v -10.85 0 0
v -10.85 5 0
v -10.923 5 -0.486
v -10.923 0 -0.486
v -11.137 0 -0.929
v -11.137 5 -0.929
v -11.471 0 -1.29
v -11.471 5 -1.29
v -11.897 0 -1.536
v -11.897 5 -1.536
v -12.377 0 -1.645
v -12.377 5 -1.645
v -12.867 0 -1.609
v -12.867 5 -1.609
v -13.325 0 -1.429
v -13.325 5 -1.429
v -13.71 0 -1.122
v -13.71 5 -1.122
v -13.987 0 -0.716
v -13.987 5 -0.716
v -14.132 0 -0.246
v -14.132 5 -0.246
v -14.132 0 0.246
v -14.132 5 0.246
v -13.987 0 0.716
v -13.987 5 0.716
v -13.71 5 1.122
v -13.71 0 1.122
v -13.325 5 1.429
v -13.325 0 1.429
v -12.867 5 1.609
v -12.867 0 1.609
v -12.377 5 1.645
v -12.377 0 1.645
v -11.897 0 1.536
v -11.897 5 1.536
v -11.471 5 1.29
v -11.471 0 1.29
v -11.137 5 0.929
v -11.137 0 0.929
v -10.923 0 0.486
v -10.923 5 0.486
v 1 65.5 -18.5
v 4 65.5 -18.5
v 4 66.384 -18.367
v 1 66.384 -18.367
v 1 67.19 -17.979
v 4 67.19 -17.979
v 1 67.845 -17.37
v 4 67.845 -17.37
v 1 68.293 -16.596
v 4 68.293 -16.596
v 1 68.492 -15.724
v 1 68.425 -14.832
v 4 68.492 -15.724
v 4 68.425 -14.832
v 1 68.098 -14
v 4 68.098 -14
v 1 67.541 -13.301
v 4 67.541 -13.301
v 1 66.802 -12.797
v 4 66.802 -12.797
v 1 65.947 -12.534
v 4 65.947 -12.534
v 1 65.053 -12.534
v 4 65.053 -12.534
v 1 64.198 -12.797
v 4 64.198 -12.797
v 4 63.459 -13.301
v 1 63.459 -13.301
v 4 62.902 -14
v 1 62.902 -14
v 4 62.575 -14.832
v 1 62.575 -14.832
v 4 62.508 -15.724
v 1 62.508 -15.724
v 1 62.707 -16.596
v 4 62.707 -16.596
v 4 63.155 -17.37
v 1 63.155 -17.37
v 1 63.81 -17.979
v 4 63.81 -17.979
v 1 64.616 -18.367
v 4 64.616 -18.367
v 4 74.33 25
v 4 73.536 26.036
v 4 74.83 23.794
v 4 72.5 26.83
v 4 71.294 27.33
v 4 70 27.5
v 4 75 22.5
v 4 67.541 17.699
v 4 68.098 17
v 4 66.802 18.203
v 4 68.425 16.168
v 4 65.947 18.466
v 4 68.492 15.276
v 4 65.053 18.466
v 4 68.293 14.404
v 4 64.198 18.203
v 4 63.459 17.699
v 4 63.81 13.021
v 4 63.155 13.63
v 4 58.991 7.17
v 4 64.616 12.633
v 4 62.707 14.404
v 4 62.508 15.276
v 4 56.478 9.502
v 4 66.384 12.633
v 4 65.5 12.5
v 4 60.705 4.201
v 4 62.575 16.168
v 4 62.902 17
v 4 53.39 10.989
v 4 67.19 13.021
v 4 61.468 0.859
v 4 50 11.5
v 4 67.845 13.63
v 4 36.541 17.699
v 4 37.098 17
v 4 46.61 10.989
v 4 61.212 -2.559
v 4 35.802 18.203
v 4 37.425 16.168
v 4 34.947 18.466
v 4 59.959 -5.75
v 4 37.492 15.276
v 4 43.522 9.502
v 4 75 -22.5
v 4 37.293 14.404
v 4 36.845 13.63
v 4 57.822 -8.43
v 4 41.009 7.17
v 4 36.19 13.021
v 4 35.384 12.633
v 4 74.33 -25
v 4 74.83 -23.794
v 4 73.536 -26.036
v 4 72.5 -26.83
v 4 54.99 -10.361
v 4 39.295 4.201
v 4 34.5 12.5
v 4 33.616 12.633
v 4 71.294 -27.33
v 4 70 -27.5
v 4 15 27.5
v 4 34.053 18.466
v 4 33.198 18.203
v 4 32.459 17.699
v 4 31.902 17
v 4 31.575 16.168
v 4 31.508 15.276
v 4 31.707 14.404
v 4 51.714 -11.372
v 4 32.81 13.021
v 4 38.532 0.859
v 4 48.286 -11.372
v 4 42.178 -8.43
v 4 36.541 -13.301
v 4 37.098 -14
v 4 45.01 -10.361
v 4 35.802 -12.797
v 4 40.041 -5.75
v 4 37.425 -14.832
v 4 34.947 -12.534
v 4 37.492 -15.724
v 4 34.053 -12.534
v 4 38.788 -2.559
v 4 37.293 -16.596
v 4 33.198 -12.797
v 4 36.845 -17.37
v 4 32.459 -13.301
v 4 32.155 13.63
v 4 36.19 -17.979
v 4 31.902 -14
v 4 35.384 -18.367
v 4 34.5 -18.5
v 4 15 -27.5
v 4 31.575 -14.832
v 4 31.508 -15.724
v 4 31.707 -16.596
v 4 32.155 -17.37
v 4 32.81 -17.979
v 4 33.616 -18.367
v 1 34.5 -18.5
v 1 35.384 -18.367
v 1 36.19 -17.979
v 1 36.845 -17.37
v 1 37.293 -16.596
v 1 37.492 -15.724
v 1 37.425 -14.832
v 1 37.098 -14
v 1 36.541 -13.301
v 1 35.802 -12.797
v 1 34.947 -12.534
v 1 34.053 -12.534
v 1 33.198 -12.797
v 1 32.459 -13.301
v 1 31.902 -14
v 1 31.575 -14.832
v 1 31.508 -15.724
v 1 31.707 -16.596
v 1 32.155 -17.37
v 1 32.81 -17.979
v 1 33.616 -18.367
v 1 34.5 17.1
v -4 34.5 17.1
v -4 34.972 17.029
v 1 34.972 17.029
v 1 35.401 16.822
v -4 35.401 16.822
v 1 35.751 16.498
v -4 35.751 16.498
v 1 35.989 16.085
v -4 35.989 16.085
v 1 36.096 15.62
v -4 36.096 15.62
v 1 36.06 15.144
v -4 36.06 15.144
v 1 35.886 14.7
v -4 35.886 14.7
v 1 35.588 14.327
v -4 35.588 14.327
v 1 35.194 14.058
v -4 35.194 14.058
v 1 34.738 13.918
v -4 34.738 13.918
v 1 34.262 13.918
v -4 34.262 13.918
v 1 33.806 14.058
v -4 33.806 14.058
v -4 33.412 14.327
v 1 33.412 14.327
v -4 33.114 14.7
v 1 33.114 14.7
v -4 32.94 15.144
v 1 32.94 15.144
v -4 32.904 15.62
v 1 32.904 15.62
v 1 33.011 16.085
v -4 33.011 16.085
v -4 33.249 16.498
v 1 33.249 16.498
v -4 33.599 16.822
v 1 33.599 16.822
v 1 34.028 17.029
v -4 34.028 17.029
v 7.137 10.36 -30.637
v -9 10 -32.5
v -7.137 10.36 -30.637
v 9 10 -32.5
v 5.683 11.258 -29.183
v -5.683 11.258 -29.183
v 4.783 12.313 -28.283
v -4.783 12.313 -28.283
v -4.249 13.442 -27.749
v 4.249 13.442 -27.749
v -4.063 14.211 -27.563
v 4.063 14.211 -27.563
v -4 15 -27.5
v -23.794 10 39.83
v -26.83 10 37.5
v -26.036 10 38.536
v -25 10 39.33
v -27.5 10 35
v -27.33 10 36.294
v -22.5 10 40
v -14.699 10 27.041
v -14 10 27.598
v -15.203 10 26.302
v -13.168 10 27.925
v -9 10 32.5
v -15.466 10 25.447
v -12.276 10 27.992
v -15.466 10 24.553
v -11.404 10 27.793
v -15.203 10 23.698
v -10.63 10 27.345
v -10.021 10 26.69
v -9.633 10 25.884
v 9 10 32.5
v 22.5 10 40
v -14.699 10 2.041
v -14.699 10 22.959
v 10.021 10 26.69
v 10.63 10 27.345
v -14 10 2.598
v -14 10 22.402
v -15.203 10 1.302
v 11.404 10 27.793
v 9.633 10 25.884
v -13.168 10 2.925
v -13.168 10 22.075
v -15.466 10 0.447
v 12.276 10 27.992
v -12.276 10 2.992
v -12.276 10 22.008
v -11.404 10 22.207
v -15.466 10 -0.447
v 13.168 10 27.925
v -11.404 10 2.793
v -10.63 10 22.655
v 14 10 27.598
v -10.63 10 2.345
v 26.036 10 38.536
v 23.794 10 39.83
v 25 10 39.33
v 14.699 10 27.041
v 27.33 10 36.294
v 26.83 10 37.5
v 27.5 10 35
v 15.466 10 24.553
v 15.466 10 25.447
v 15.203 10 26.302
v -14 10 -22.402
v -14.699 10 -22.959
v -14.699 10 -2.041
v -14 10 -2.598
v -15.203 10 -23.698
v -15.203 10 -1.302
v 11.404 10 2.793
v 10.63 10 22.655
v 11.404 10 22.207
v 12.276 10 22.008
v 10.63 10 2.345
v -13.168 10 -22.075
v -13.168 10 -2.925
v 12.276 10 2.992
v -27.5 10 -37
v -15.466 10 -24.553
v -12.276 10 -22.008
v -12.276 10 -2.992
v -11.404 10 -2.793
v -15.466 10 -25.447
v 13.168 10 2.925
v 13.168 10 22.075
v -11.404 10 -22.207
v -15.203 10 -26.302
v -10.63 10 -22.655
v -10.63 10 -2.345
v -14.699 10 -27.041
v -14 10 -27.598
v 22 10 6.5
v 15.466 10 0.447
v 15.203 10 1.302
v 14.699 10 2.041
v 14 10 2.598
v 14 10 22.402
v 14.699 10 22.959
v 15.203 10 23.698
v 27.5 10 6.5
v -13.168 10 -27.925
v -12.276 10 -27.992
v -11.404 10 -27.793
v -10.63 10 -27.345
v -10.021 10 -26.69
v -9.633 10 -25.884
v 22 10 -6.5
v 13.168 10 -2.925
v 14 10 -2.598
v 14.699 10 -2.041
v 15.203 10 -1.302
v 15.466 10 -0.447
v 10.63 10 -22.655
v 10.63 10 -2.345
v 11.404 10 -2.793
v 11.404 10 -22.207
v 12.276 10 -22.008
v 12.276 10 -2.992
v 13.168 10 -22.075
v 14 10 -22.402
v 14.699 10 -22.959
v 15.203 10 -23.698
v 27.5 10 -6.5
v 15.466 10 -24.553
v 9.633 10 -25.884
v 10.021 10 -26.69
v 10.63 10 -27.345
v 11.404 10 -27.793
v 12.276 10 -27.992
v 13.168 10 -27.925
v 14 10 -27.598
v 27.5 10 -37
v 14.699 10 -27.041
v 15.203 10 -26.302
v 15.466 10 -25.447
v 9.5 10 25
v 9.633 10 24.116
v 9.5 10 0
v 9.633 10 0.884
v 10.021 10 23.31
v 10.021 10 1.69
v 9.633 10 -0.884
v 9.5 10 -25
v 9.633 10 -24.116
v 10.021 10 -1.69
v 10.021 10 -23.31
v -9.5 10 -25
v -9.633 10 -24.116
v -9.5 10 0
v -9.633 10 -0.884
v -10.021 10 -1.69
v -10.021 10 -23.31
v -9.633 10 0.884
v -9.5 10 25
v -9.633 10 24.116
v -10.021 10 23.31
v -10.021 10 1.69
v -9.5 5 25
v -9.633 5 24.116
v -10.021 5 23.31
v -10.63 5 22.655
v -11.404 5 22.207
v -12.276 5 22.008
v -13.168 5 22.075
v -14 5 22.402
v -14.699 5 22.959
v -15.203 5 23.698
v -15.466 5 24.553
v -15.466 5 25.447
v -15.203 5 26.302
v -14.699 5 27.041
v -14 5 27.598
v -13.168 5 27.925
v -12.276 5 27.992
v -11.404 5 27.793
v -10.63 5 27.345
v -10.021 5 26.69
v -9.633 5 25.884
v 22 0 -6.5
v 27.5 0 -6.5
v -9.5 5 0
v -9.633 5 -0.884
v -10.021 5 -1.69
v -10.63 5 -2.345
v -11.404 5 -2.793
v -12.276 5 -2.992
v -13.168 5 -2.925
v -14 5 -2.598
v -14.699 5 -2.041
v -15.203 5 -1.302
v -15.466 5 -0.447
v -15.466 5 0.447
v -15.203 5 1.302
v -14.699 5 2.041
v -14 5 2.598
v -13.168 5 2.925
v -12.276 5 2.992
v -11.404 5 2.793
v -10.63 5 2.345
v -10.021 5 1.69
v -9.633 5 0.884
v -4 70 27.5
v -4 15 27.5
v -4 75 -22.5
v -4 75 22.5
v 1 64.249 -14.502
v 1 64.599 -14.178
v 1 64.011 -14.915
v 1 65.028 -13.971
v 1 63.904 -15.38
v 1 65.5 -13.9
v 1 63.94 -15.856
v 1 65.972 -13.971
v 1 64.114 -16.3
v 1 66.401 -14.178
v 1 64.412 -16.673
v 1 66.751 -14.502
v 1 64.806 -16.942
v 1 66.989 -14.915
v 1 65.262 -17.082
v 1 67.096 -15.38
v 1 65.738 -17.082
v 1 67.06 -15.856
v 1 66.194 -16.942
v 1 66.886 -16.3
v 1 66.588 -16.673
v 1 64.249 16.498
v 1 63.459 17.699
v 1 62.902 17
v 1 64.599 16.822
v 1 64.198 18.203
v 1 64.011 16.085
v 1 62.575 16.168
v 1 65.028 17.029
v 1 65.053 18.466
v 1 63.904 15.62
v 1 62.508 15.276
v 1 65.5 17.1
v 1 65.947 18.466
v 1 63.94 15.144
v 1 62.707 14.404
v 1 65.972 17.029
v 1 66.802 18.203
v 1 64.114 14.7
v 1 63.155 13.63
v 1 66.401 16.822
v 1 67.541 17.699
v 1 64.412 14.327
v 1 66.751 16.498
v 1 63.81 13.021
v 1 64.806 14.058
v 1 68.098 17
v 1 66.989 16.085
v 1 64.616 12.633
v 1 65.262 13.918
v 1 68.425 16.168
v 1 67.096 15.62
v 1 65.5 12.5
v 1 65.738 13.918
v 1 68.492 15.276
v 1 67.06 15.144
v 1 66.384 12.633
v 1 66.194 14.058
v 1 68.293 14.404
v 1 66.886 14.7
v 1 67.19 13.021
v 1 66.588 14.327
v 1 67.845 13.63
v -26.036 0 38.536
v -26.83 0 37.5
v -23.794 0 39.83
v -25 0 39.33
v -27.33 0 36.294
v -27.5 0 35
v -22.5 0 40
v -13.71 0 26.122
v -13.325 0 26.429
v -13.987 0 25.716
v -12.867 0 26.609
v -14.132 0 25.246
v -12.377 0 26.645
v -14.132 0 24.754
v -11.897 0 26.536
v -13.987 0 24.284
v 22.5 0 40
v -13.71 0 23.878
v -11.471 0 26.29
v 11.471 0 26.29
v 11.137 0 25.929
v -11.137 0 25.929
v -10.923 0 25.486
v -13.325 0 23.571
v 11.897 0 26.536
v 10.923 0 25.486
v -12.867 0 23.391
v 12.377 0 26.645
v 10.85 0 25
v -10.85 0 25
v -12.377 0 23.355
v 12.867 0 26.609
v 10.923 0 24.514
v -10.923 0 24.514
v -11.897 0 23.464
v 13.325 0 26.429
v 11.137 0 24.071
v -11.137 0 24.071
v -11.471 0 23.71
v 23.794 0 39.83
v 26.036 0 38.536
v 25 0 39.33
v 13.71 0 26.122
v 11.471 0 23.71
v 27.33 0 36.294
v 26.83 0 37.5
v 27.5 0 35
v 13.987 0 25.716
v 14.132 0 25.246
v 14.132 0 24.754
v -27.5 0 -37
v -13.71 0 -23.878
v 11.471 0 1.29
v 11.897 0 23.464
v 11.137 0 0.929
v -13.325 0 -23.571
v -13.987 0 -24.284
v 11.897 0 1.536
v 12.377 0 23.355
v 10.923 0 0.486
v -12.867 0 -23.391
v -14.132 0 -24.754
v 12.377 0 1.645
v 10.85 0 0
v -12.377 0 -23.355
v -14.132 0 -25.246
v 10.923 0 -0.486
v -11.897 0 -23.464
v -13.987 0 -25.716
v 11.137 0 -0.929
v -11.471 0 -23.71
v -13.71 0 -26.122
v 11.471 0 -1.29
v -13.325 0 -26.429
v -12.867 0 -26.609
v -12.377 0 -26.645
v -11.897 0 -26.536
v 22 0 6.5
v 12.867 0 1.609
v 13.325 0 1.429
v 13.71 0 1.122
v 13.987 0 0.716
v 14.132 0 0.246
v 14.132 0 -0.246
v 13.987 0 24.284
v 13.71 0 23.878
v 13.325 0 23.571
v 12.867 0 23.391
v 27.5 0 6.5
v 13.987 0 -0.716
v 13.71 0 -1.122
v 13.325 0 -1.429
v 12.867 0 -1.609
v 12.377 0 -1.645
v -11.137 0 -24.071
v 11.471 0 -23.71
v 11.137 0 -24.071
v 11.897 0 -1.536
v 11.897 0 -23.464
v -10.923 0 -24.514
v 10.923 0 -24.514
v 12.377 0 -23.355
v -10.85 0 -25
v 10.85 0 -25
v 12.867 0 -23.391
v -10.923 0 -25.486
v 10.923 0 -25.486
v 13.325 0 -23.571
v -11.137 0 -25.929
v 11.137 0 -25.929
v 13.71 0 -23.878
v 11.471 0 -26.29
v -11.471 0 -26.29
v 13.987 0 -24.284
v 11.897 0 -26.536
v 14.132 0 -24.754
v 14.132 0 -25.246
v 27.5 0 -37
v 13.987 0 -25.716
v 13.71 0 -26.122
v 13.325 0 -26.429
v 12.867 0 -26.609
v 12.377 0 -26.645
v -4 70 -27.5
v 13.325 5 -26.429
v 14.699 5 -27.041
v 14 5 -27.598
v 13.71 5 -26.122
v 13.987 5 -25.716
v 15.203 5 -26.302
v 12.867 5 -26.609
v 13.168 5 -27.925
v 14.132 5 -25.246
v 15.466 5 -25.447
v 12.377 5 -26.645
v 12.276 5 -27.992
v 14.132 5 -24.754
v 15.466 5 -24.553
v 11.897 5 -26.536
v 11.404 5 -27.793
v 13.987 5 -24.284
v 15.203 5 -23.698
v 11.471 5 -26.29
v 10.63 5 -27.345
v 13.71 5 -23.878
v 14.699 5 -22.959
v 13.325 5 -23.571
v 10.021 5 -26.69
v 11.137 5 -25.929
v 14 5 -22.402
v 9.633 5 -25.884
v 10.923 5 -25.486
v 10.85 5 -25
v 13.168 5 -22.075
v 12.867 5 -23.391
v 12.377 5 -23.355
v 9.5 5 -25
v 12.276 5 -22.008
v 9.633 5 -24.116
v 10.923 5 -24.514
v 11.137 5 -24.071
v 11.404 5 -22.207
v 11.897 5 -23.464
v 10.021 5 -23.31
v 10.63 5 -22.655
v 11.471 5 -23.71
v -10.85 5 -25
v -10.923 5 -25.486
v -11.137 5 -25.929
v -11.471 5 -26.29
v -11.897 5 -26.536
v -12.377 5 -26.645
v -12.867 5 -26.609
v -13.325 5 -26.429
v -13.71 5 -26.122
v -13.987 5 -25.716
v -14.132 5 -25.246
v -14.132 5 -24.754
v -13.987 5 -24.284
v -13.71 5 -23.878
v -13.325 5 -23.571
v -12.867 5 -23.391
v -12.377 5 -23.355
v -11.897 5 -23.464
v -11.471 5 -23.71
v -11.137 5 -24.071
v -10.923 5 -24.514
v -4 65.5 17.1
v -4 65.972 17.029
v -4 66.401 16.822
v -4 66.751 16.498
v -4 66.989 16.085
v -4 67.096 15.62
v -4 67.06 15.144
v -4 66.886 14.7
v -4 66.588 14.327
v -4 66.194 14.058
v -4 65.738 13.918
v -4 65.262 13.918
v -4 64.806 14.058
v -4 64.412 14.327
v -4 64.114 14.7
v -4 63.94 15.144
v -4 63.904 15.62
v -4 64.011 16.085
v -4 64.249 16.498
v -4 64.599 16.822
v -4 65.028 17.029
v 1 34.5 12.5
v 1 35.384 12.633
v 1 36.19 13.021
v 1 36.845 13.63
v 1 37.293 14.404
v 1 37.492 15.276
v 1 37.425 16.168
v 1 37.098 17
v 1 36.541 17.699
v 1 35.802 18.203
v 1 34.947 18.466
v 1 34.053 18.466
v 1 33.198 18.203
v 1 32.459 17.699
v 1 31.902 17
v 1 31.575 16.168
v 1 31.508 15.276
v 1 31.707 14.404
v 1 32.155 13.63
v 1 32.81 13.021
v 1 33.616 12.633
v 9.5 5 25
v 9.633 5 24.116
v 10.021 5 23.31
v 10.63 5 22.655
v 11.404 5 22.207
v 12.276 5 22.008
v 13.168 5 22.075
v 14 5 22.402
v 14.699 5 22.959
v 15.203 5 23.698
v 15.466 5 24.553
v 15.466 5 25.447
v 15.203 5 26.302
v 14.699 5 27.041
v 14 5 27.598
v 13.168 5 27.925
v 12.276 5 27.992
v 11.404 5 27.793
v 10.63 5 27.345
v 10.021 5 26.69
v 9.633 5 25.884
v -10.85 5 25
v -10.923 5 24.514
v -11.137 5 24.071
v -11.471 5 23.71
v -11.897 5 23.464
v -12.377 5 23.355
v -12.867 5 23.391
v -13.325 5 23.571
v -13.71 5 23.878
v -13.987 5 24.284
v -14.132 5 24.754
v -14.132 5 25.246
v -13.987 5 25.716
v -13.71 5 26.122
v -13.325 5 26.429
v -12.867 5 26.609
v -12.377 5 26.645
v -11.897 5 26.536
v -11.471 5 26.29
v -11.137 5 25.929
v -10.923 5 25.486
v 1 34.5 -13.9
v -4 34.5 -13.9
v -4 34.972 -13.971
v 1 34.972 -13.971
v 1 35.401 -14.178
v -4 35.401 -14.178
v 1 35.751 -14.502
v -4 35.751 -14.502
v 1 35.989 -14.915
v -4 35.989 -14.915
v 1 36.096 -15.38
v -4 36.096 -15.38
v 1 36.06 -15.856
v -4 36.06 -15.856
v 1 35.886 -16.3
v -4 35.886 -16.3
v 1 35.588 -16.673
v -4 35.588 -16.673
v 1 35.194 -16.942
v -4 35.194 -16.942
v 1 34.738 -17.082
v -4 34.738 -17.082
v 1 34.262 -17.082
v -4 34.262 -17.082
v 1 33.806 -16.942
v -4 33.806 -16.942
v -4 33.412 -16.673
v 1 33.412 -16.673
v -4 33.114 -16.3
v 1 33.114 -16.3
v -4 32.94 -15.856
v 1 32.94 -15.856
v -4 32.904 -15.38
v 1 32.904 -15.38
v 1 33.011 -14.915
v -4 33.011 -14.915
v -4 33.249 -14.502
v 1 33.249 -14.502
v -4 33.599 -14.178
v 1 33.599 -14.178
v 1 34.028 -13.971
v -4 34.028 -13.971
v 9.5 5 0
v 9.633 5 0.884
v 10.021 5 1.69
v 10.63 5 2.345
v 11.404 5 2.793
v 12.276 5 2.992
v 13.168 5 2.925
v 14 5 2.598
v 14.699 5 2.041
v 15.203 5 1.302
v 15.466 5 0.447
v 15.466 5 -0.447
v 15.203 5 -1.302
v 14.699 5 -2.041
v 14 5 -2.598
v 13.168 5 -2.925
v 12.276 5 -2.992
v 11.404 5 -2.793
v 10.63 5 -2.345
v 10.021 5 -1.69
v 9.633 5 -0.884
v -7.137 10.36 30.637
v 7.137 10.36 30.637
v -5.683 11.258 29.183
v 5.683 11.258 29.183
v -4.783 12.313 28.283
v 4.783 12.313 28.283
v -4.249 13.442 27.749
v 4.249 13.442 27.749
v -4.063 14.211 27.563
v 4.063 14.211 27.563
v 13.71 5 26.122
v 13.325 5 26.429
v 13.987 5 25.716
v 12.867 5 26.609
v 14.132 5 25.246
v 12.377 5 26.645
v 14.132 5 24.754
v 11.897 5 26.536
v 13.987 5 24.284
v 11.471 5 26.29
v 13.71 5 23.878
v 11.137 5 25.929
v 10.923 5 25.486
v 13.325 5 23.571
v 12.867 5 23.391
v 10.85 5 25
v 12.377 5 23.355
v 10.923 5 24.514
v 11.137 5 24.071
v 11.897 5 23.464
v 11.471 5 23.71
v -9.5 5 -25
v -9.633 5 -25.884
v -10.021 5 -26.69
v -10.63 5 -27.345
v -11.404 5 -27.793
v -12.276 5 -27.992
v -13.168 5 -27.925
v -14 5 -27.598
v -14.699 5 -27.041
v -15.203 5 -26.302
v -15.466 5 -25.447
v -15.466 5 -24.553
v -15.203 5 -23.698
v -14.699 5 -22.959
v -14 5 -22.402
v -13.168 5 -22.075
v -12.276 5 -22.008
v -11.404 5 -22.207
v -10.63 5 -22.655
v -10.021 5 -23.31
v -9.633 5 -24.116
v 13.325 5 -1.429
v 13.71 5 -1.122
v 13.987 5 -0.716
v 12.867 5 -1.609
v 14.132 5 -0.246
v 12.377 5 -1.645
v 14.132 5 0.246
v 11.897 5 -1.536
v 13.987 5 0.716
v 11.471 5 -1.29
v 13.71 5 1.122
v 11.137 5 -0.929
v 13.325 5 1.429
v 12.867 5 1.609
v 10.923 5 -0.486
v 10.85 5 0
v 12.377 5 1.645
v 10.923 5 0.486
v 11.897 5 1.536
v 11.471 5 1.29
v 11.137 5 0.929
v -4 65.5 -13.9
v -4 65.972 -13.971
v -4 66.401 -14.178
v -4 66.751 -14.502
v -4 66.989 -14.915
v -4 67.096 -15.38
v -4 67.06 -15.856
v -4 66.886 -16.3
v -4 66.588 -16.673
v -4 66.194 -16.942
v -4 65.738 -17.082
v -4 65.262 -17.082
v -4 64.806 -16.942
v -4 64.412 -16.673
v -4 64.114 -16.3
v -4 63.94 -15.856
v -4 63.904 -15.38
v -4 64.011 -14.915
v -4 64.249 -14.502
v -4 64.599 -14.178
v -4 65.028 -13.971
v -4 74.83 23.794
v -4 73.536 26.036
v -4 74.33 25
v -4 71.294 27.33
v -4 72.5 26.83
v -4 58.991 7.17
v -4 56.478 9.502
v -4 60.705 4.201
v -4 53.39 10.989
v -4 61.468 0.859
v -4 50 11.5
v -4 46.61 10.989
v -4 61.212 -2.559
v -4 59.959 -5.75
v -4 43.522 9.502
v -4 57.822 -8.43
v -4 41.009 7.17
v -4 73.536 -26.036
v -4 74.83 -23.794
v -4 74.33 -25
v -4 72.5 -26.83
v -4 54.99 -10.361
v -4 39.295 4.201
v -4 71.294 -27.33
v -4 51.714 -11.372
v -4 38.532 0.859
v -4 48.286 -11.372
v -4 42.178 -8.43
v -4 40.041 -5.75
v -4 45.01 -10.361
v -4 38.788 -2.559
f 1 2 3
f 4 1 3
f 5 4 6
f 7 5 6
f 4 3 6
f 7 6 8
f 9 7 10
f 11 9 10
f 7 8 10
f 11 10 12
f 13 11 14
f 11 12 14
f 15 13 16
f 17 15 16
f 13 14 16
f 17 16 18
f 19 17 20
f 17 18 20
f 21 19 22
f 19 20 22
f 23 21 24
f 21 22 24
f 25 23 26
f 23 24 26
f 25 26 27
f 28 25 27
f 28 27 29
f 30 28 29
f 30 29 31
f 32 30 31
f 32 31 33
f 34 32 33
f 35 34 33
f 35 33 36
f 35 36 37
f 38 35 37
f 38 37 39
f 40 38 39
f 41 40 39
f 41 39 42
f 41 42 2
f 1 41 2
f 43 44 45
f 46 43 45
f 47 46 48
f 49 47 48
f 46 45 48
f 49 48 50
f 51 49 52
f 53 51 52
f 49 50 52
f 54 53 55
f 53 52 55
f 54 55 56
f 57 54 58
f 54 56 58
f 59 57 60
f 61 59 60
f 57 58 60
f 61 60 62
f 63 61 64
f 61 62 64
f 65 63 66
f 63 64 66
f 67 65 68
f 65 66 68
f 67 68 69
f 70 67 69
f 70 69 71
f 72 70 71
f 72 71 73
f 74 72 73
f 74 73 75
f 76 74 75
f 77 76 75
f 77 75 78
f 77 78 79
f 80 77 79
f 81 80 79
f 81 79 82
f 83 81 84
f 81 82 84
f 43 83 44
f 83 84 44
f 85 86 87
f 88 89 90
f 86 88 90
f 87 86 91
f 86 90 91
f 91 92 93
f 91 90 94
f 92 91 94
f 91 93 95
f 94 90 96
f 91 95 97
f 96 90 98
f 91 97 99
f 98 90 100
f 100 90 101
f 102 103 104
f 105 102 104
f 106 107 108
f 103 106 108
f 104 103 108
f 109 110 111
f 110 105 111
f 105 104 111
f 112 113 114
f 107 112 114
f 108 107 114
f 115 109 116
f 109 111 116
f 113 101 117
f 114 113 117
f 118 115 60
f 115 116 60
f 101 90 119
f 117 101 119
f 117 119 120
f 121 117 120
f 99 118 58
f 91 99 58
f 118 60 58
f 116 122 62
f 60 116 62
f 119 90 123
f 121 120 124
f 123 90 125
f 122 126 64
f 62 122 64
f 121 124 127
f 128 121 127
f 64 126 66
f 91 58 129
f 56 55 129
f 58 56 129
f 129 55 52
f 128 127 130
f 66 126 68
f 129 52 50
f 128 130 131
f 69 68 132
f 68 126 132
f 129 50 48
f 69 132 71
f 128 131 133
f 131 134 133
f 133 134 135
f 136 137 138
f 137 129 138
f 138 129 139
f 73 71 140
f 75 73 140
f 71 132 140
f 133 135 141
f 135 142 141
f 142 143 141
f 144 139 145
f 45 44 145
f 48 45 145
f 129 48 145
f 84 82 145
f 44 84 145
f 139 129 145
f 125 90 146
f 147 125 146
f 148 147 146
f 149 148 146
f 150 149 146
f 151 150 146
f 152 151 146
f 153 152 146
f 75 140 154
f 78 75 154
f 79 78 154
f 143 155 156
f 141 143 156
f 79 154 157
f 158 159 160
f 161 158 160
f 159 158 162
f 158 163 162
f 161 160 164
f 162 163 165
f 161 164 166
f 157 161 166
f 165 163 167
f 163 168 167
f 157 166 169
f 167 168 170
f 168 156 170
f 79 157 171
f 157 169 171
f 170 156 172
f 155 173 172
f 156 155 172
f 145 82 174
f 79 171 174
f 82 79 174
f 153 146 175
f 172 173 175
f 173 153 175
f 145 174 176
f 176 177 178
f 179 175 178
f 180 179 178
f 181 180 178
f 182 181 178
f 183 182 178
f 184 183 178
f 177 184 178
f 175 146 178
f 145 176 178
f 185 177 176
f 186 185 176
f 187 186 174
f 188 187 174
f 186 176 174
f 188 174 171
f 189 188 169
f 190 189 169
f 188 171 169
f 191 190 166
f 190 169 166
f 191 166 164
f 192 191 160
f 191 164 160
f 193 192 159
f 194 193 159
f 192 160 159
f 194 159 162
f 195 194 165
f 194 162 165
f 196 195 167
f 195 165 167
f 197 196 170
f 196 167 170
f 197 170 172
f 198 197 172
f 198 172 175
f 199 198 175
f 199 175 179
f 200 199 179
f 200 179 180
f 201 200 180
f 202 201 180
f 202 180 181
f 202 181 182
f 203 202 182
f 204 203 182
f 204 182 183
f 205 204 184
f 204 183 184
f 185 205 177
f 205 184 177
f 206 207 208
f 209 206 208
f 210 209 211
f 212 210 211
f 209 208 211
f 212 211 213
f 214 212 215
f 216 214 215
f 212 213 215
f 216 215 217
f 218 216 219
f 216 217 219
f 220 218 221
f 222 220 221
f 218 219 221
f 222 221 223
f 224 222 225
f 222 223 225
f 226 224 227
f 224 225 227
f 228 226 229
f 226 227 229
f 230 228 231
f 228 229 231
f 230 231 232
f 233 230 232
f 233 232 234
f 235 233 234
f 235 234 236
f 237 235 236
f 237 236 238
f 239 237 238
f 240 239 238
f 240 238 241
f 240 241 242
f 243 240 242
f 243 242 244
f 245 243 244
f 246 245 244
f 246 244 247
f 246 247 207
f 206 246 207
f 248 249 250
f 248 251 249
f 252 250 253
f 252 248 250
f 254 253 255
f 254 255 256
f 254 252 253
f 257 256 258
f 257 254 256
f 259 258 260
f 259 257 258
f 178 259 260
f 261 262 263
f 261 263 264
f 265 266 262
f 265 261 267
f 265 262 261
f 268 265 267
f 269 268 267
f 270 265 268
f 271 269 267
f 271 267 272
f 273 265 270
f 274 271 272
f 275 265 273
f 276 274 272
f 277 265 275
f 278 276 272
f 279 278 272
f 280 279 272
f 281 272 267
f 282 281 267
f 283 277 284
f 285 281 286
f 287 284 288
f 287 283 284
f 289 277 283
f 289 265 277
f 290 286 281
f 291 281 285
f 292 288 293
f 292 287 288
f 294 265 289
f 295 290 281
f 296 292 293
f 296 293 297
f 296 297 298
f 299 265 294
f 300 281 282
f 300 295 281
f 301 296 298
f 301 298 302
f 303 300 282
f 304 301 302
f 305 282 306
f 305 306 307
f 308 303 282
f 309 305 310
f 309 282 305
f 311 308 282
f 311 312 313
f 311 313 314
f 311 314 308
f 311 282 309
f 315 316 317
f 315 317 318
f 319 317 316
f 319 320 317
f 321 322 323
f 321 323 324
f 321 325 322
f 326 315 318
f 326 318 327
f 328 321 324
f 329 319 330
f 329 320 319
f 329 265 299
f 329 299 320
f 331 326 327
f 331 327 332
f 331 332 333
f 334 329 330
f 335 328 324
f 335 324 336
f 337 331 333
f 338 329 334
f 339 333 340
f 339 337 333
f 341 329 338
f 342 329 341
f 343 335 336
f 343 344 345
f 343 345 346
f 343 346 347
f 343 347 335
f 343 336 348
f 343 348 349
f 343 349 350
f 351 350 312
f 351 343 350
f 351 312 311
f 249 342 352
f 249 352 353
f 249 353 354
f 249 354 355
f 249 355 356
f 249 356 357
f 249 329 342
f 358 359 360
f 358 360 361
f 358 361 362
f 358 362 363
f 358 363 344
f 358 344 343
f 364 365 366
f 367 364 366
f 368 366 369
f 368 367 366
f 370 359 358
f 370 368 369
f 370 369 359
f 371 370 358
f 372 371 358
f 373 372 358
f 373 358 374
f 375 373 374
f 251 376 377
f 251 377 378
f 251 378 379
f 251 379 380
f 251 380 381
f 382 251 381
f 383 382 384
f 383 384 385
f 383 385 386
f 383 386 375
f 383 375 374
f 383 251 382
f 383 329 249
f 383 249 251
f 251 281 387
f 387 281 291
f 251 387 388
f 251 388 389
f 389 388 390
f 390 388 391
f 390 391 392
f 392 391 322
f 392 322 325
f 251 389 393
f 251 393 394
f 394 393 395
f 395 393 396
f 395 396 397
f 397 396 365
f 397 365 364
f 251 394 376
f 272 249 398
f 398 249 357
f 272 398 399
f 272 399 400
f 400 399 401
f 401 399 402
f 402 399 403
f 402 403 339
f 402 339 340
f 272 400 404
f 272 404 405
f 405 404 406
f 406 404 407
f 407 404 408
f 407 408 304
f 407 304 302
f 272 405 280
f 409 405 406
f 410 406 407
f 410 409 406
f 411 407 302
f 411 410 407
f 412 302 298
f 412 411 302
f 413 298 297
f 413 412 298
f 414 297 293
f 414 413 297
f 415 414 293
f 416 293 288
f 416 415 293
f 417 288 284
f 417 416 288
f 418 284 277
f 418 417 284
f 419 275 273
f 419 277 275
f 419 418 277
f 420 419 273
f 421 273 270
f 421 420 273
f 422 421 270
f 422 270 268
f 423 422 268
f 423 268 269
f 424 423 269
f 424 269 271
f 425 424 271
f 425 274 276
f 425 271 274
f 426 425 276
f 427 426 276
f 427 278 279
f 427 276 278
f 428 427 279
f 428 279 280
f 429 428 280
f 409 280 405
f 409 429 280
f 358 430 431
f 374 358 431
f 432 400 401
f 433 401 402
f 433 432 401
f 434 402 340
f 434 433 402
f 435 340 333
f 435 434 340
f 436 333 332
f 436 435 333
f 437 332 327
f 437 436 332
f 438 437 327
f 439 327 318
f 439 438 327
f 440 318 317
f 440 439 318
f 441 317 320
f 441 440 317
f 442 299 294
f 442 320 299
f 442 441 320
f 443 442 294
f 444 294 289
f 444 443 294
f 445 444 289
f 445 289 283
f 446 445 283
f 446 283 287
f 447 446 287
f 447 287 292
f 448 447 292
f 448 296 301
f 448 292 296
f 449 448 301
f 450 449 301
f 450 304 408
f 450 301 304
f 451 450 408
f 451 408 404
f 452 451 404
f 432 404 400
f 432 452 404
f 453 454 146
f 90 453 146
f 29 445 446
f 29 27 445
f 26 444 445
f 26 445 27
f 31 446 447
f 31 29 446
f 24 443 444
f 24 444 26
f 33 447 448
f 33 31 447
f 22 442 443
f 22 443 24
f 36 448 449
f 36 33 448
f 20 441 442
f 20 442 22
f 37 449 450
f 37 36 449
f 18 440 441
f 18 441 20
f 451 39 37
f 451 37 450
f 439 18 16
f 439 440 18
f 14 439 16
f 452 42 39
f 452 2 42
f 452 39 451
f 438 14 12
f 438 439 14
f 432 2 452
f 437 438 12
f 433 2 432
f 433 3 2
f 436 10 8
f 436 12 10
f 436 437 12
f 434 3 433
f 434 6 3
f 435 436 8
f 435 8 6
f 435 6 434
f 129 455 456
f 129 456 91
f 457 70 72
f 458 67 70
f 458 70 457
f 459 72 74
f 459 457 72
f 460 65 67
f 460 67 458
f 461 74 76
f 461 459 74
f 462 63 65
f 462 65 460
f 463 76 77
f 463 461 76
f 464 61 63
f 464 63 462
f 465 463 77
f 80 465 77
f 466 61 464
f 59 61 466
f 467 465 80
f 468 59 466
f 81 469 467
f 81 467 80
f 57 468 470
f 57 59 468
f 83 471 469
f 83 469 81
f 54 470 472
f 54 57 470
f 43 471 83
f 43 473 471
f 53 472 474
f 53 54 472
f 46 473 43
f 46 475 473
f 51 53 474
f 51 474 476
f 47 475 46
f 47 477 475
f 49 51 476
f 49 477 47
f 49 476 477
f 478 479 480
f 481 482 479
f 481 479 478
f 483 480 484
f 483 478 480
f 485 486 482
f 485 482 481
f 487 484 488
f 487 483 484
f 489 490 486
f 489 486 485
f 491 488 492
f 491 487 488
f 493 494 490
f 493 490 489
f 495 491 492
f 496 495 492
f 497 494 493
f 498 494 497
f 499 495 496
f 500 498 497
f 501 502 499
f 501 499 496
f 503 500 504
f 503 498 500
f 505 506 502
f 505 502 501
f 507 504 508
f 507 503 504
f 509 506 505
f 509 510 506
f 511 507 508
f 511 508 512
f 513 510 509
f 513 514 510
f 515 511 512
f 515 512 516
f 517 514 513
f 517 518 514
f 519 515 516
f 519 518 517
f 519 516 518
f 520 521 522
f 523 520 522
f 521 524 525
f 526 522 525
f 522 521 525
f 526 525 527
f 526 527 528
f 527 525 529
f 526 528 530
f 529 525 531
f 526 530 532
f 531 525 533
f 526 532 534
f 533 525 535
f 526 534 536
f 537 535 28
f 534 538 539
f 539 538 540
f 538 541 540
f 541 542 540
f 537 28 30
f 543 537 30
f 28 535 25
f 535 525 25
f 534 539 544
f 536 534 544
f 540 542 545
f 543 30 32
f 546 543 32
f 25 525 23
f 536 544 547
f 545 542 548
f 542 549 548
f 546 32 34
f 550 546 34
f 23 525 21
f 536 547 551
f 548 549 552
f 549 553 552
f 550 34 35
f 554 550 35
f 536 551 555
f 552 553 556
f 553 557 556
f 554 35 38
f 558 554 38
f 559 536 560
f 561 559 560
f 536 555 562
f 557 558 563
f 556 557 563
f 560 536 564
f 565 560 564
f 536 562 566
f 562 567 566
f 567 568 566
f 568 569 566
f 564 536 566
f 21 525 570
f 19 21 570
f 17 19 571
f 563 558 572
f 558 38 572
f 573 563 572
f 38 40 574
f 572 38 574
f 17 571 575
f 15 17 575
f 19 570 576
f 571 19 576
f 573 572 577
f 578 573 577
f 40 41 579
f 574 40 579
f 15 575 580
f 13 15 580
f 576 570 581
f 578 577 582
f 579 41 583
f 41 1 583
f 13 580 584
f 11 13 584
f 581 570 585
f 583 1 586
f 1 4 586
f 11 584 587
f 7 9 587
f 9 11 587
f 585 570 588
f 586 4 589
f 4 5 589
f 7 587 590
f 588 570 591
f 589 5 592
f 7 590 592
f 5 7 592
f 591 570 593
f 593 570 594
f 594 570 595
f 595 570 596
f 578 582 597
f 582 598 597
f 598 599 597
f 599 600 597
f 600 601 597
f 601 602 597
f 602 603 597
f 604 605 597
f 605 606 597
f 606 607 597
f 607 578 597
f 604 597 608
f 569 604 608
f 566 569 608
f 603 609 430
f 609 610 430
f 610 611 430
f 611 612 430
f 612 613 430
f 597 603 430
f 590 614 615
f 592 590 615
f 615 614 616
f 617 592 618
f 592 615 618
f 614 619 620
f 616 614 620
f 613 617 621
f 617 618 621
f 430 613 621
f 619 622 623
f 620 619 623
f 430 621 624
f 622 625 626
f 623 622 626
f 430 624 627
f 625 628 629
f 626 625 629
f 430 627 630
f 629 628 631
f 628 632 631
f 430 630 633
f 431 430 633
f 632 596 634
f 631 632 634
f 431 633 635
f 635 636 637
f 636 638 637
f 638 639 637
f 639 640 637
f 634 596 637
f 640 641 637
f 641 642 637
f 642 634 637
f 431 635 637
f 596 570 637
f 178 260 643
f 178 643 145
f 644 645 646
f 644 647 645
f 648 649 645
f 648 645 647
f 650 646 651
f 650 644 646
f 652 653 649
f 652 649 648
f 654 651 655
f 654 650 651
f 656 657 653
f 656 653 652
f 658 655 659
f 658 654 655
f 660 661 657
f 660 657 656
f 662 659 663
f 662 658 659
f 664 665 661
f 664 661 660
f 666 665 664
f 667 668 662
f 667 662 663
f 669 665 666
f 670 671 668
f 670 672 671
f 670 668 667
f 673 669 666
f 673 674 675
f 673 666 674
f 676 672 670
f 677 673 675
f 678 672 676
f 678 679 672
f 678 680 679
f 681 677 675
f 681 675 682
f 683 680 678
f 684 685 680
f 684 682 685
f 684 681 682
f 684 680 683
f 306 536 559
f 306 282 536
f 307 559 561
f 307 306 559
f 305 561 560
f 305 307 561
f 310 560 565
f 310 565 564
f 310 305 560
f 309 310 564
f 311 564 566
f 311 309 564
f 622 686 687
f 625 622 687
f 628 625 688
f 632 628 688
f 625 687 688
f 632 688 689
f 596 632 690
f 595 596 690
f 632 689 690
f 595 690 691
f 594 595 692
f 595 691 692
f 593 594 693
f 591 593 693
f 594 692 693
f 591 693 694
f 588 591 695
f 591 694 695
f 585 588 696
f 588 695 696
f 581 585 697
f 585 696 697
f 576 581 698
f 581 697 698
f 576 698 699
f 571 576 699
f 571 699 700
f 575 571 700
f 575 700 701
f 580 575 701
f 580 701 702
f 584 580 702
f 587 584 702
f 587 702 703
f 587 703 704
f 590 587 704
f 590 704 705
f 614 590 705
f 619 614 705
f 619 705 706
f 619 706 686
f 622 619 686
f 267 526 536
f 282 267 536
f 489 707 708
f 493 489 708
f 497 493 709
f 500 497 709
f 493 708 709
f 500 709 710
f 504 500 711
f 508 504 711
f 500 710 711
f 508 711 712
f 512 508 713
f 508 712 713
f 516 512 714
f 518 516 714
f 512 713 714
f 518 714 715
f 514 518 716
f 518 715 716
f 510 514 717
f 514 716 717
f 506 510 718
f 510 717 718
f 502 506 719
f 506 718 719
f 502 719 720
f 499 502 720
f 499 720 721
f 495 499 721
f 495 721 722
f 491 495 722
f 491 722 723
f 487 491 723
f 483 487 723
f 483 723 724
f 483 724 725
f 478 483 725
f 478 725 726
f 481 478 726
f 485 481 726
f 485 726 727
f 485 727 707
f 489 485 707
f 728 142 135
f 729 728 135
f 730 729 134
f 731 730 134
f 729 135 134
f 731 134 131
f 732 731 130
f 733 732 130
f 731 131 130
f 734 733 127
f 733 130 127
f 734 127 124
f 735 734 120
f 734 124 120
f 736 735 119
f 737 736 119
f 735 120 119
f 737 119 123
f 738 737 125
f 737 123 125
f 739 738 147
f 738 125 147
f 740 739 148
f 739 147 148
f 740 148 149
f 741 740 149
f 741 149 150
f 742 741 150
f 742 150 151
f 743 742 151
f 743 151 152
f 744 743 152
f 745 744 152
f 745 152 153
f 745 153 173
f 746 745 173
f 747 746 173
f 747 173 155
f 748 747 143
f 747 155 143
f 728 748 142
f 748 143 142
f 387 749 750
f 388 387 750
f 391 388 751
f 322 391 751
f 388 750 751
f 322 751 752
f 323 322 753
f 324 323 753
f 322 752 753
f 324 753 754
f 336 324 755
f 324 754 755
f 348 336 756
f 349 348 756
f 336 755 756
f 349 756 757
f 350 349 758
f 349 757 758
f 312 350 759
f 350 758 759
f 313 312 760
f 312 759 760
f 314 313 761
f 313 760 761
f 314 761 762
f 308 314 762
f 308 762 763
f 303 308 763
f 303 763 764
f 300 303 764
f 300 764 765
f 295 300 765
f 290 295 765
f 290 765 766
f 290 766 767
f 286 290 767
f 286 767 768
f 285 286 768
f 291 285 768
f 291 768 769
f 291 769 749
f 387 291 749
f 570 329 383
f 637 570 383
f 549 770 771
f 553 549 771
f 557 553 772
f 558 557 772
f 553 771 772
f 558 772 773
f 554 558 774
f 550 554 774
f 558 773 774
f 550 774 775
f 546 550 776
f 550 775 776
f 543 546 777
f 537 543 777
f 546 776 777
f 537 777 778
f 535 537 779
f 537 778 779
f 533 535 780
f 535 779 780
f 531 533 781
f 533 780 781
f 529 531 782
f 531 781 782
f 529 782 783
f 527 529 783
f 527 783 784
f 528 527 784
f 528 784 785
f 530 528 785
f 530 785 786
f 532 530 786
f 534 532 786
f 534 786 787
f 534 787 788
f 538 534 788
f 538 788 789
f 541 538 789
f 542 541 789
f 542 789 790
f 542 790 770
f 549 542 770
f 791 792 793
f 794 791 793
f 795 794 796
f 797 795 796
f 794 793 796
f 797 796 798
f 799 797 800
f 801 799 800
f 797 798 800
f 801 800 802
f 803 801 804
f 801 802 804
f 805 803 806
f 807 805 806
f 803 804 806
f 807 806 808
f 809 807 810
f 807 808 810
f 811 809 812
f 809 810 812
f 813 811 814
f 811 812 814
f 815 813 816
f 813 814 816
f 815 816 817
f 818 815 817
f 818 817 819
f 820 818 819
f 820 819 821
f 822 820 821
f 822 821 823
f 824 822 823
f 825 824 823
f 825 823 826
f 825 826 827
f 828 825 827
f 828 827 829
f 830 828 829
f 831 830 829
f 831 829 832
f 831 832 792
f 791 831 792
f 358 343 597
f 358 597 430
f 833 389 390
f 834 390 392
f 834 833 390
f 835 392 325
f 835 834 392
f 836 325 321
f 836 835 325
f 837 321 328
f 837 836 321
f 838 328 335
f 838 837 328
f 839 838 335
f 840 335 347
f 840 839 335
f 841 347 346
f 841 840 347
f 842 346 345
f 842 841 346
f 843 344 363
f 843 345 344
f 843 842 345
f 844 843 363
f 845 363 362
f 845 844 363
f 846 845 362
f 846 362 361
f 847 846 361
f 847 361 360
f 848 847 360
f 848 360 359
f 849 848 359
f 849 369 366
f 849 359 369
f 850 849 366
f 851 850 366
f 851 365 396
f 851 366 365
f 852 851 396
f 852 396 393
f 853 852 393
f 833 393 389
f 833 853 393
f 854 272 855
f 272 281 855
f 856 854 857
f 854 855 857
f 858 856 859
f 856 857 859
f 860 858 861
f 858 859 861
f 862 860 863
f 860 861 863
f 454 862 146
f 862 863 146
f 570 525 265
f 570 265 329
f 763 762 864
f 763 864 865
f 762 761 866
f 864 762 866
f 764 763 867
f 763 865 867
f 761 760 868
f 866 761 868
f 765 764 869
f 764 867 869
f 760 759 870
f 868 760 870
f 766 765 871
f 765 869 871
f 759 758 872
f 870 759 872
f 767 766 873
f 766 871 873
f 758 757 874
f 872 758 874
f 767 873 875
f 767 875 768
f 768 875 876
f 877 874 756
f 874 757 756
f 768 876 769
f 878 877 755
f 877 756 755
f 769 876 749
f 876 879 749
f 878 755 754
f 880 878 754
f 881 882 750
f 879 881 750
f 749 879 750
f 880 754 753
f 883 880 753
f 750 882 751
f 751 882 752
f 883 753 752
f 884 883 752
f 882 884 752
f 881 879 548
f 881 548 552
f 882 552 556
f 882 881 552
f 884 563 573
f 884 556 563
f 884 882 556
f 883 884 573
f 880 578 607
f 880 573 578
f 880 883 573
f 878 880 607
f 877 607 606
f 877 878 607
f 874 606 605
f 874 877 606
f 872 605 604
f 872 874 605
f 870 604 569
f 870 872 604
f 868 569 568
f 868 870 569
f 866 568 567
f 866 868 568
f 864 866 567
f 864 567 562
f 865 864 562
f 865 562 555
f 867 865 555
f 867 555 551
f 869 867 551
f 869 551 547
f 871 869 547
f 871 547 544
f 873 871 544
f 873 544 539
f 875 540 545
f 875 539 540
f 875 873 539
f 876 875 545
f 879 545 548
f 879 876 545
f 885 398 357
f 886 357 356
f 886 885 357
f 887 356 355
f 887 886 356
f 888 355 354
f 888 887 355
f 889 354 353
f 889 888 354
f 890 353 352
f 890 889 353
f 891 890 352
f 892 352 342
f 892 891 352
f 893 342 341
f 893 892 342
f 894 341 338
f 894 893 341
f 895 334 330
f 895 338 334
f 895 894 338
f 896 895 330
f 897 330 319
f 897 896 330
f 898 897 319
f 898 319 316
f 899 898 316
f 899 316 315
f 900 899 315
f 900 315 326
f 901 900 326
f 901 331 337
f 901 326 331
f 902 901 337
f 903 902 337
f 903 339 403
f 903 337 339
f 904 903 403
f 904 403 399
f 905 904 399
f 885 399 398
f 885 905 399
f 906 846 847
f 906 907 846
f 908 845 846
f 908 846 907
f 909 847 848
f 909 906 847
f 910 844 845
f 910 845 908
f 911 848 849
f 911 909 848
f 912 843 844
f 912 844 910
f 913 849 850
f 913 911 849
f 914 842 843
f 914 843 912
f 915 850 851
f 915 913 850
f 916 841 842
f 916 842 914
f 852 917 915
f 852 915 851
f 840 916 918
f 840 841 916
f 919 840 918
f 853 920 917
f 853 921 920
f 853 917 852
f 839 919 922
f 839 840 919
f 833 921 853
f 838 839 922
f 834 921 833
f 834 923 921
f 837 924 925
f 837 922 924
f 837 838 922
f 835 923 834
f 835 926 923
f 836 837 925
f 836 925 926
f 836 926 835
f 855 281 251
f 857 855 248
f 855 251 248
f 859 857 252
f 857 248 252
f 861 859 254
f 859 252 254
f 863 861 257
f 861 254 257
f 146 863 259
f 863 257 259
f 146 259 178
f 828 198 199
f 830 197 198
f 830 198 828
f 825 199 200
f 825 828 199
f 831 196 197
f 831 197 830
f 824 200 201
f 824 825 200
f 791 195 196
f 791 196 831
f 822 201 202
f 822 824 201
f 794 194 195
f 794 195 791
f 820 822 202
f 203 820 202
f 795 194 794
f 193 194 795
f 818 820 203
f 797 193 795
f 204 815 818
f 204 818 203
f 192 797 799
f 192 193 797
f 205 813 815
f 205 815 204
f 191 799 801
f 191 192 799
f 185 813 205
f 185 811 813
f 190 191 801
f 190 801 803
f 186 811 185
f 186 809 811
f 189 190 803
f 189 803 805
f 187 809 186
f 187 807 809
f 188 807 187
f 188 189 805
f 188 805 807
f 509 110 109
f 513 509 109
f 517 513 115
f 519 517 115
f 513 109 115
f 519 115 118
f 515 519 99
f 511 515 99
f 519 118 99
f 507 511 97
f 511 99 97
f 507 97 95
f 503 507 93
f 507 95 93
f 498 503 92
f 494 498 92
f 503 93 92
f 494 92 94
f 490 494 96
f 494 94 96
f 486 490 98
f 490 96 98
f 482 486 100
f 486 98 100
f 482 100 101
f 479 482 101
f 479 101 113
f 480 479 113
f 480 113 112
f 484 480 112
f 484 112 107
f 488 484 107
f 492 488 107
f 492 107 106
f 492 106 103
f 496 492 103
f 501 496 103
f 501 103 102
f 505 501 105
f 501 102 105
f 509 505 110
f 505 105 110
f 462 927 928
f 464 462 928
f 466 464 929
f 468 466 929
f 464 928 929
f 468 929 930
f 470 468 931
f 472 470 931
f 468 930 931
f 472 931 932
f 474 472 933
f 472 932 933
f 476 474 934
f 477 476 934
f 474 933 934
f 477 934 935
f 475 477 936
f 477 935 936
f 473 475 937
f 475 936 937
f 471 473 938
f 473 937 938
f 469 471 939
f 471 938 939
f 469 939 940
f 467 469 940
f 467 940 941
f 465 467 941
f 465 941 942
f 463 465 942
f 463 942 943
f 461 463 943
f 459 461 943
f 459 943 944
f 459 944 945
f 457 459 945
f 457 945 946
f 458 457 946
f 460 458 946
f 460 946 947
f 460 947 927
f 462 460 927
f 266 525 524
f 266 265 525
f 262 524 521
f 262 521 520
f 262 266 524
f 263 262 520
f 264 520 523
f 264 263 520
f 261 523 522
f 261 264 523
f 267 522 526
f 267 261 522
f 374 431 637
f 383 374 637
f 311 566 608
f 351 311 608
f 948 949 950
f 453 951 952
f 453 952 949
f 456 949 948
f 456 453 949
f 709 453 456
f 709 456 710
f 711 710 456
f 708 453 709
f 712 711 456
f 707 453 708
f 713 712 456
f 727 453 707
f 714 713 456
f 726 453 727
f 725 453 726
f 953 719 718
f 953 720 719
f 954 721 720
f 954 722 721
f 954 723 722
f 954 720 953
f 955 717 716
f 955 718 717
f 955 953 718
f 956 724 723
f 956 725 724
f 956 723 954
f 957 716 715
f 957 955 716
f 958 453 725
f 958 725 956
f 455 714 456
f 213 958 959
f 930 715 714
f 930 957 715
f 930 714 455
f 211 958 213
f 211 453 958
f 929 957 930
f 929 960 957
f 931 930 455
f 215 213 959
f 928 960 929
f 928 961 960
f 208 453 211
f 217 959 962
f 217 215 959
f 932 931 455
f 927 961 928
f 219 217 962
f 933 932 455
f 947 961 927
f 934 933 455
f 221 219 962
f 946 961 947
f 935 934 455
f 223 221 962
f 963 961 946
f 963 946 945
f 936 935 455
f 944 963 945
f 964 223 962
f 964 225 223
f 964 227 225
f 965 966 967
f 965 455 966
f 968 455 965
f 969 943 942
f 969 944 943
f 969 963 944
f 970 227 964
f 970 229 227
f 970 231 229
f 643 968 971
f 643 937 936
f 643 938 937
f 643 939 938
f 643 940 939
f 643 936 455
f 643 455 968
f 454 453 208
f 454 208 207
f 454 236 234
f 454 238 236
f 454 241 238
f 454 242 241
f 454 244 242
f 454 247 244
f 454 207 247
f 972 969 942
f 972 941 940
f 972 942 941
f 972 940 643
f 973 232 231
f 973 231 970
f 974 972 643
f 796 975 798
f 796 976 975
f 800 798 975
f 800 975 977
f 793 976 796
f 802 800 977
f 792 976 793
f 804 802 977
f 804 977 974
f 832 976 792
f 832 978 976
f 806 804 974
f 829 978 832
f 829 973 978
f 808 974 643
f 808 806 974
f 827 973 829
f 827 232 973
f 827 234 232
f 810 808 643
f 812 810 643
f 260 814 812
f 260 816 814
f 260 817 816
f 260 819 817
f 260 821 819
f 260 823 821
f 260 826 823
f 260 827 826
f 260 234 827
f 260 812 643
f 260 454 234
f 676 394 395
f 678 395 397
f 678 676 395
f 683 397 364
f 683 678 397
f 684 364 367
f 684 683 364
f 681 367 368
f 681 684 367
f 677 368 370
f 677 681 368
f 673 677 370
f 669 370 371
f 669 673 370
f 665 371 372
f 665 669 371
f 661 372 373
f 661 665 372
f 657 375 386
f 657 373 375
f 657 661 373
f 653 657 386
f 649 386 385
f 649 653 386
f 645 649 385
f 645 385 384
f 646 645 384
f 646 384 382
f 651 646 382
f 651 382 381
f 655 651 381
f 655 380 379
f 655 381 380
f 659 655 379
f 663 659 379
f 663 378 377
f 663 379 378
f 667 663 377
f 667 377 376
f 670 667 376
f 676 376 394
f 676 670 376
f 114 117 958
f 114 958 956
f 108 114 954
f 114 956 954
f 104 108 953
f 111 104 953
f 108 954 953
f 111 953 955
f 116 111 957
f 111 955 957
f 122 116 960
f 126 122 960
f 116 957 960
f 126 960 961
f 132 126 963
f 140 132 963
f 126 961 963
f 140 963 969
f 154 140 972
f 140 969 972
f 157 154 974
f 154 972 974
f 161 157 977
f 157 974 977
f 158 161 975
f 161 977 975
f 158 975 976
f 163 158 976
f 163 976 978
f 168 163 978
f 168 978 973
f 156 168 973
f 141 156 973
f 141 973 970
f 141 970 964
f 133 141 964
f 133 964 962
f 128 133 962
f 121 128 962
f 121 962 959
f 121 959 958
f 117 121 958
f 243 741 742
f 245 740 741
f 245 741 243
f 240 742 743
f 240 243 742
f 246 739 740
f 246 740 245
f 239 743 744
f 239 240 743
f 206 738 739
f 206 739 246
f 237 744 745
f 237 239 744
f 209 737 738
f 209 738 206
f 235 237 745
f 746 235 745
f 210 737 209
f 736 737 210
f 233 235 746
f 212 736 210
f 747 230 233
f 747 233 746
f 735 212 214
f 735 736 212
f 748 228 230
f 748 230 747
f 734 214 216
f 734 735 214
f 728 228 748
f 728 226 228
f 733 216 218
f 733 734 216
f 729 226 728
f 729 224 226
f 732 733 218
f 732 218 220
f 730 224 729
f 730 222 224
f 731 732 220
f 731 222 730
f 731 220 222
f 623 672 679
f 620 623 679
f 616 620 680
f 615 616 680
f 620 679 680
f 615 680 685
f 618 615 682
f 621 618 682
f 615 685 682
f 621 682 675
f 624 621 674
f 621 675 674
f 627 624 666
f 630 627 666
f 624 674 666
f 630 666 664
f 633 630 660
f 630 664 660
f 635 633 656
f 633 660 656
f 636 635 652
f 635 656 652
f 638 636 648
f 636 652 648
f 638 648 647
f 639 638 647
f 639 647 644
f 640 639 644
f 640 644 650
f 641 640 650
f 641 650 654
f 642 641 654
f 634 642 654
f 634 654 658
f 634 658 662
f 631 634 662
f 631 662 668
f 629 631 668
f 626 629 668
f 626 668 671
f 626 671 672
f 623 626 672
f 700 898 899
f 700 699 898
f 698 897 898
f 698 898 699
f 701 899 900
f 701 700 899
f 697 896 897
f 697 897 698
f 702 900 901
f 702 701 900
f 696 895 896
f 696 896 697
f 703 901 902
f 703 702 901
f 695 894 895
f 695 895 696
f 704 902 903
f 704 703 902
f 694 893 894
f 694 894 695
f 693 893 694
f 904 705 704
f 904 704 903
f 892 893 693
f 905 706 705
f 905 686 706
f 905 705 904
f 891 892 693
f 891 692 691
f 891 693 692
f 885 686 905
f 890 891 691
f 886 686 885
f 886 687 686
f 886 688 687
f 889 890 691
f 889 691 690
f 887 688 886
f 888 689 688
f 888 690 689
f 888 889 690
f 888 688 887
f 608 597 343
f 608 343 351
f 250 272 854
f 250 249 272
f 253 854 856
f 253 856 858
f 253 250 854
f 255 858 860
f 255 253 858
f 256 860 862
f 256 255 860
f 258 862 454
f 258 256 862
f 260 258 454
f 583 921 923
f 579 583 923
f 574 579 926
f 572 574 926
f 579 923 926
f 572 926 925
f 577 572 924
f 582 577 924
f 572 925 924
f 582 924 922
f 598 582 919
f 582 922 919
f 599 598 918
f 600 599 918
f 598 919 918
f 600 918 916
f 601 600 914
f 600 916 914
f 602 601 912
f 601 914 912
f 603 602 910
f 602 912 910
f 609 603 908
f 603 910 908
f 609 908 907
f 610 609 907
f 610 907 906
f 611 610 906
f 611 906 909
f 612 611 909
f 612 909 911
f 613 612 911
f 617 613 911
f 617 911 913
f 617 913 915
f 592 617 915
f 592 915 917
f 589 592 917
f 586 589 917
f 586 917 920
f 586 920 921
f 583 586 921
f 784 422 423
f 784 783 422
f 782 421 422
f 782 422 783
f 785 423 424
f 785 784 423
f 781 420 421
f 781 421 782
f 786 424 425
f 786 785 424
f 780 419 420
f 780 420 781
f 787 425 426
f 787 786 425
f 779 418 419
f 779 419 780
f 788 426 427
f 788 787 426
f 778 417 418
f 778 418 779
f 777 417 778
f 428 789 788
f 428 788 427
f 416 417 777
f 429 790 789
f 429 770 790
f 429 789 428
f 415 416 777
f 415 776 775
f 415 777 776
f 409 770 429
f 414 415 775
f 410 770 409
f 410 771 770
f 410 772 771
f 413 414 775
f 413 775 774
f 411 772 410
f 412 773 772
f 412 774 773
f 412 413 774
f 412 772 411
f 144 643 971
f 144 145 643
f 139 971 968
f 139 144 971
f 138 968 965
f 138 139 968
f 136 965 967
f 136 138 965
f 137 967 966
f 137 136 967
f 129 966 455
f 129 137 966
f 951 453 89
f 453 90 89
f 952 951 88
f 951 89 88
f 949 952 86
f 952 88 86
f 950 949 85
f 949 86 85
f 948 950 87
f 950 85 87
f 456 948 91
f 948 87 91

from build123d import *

# Parameters (mm, degrees)
SKETCH1_W               = 55
SKETCH1_H               = 80
BOSS_EXTRUDE1_DEPTH     = 10
SKETCH6_R               = 1.65
CUT_EXTRUDE2_DEPTH      = 55
LPATTERN1_COUNT         = 3
LPATTERN1_PITCH         = 25
MIRROR3_COPY_1_SKETCH_R = 1.65
MIRROR3_COPY_1_DEPTH    = 55
MIRROR3_COPY_2_SKETCH_R = 1.65
MIRROR3_COPY_2_DEPTH    = 55
SKETCH8_W               = 8
SKETCH8_H               = 55
BOSS_EXTRUDE3_DEPTH     = 65
FILLET3_R               = 5
SKETCH9_R               = 1.6
SKETCH9_R_2             = 11.5
CUT_EXTRUDE3_DEPTH      = 32.5
SKETCH10_R              = 3
CUT_EXTRUDE4_DEPTH      = 3
CUT_EXTRUDE5_START      = -5
SKETCH11_R              = 3
CUT_EXTRUDE5_DEPTH      = 71
LPATTERN2_COUNT         = 3
LPATTERN2_PITCH         = 25
MIRROR4_START           = -5
MIRROR4_COPY_1_SKETCH_R = 3
MIRROR4_COPY_1_DEPTH    = 71
MIRROR4_COPY_2_SKETCH_R = 3
MIRROR4_COPY_2_DEPTH    = 71
SKETCH12_W              = 11
SKETCH12_H              = 13
CUT_EXTRUDE6_DEPTH      = 11
CUT_EXTRUDE7_DEPTH      = 10


with BuildPart() as part:
    # Sketch1 → Boss-Extrude1 (new body)
    with BuildSketch(Plane(origin=(0, 0, 0), x_dir=(1, 0, 0), z_dir=(0, 1, 0))):
        Rectangle(SKETCH1_W, SKETCH1_H)
    extrude(amount=BOSS_EXTRUDE1_DEPTH)

    # Sketch6 → Cut-Extrude2 (cut)
    with BuildSketch(Plane(origin=(0, 10, 0), x_dir=(1, 0, 0), z_dir=(0, 1, 0))):
        with Locations((-12.5, -25)):
            Circle(SKETCH6_R)
    cut_extrude2 = extrude(amount=-CUT_EXTRUDE2_DEPTH, mode=Mode.SUBTRACT)

    # LPattern1: Cut-Extrude2 ×3
    with Locations(*[(0, 0, -i * LPATTERN1_PITCH) for i in range(1, LPATTERN1_COUNT)]):
        add(cut_extrude2, mode=Mode.SUBTRACT)

    # Mirror3: Cut-Extrude2 across plane
    add(cut_extrude2.mirror(Plane(origin=(0, 0, 0), x_dir=(0, 0, 1), z_dir=(1, 0, 0))), mode=Mode.SUBTRACT)

    # Mirror3 copy 1 sketch → Mirror3 copy 1 (cut)
    with BuildSketch(Plane(origin=(0, 10, -25), x_dir=(-1, 0, 0), z_dir=(0, 1, 0))):
        with Locations((-12.5, 25)):
            Circle(MIRROR3_COPY_1_SKETCH_R)
    extrude(amount=-MIRROR3_COPY_1_DEPTH, mode=Mode.SUBTRACT)

    # Mirror3 copy 2 sketch → Mirror3 copy 2 (cut)
    with BuildSketch(Plane(origin=(0, 10, -50), x_dir=(-1, 0, 0), z_dir=(0, 1, 0))):
        with Locations((-12.5, 25)):
            Circle(MIRROR3_COPY_2_SKETCH_R)
    extrude(amount=-MIRROR3_COPY_2_DEPTH, mode=Mode.SUBTRACT)

    # Sketch8 → Boss-Extrude3 (add)
    with BuildSketch(Plane(origin=(0, 10, 0), x_dir=(1, 0, 0), z_dir=(0, 1, 0))):
        Rectangle(SKETCH8_W, SKETCH8_H)
    extrude(amount=BOSS_EXTRUDE3_DEPTH)

    # Fillet3
    fillet3_edges = [part.edges().sort_by_distance(p)[0] for p in [
        (4, 10, 0),
        (0, 10, -27.5),
        (-4, 10, 0),
        (0, 10, 27.5),
        (0, 75, -27.5),
        (0, 75, 27.5),
        (27.5, 5, 40),
        (-27.5, 5, 40),
    ]]
    fillet(fillet3_edges, radius=FILLET3_R)

    # Sketch9 → Cut-Extrude3 (cut, through all)
    with BuildSketch(Plane.ZY.offset(4)):
        with Locations((-15.5, 65.5)):
            Circle(SKETCH9_R)
        with Locations((15.5, 65.5)):
            Circle(SKETCH9_R)
        with Locations((-15.5, 34.5)):
            Circle(SKETCH9_R)
        with Locations((15.5, 34.5)):
            Circle(SKETCH9_R)
        with Locations((0, 50)):
            Circle(SKETCH9_R_2)
    extrude(amount=-CUT_EXTRUDE3_DEPTH, mode=Mode.SUBTRACT)

    # Sketch10 → Cut-Extrude4 (cut)
    with BuildSketch(Plane(origin=(4, 0, 0), x_dir=(0, 0, -1), z_dir=(1, 0, 0))):
        with Locations((-15.5, 65.5)):
            Circle(SKETCH10_R)
        with Locations((15.5, 65.5)):
            Circle(SKETCH10_R)
        with Locations((15.5, 34.5)):
            Circle(SKETCH10_R)
        with Locations((-15.5, 34.5)):
            Circle(SKETCH10_R)
    extrude(amount=-CUT_EXTRUDE4_DEPTH, mode=Mode.SUBTRACT)

    # Sketch11 → Cut-Extrude5 (cut)
    with BuildSketch(Plane(origin=(0, 10, 0), x_dir=(1, 0, 0), z_dir=(0, 1, 0)).offset(CUT_EXTRUDE5_START)):
        with Locations((-12.5, -25)):
            Circle(SKETCH11_R)
    cut_extrude5 = extrude(amount=CUT_EXTRUDE5_DEPTH, mode=Mode.SUBTRACT)

    # LPattern2: Cut-Extrude5 ×3
    with Locations(*[(0, 0, -i * LPATTERN2_PITCH) for i in range(1, LPATTERN2_COUNT)]):
        add(cut_extrude5, mode=Mode.SUBTRACT)

    # Mirror4: Cut-Extrude5 across plane
    add(cut_extrude5.mirror(Plane(origin=(0, 0, 0), x_dir=(0, 0, 1), z_dir=(1, 0, 0))), mode=Mode.SUBTRACT)

    # Mirror4 copy 1 sketch → Mirror4 copy 1 (cut)
    with BuildSketch(Plane(origin=(0, 10, -25), x_dir=(-1, 0, 0), z_dir=(0, 1, 0)).offset(MIRROR4_START)):
        with Locations((-12.5, 25)):
            Circle(MIRROR4_COPY_1_SKETCH_R)
    extrude(amount=MIRROR4_COPY_1_DEPTH, mode=Mode.SUBTRACT)

    # Mirror4 copy 2 sketch → Mirror4 copy 2 (cut)
    with BuildSketch(Plane(origin=(0, 10, -50), x_dir=(-1, 0, 0), z_dir=(0, 1, 0)).offset(MIRROR4_START)):
        with Locations((-12.5, 25)):
            Circle(MIRROR4_COPY_2_SKETCH_R)
    extrude(amount=MIRROR4_COPY_2_DEPTH, mode=Mode.SUBTRACT)

    # Sketch12 → Cut-Extrude6 (cut, through all)
    with BuildSketch(Plane(origin=(0, 10, 0), x_dir=(1, 0, 0), z_dir=(0, 1, 0))):
        with Locations((27.5, 0)):
            Rectangle(SKETCH12_W, SKETCH12_H)
    extrude(amount=-CUT_EXTRUDE6_DEPTH, mode=Mode.SUBTRACT)

    # Sketch13 → Cut-Extrude7 (cut)
    with BuildSketch(Plane(origin=(0, 10, 0), x_dir=(1, 0, 0), z_dir=(0, 1, 0))):
        Polygon((-12.5, 37), (34.859752384, 37), (34.859752384, 45.853513443), (-44.482070636, 45.853513443), (-44.482070636, 37), align=None)
    extrude(amount=-CUT_EXTRUDE7_DEPTH, mode=Mode.SUBTRACT)


solid = part.part
